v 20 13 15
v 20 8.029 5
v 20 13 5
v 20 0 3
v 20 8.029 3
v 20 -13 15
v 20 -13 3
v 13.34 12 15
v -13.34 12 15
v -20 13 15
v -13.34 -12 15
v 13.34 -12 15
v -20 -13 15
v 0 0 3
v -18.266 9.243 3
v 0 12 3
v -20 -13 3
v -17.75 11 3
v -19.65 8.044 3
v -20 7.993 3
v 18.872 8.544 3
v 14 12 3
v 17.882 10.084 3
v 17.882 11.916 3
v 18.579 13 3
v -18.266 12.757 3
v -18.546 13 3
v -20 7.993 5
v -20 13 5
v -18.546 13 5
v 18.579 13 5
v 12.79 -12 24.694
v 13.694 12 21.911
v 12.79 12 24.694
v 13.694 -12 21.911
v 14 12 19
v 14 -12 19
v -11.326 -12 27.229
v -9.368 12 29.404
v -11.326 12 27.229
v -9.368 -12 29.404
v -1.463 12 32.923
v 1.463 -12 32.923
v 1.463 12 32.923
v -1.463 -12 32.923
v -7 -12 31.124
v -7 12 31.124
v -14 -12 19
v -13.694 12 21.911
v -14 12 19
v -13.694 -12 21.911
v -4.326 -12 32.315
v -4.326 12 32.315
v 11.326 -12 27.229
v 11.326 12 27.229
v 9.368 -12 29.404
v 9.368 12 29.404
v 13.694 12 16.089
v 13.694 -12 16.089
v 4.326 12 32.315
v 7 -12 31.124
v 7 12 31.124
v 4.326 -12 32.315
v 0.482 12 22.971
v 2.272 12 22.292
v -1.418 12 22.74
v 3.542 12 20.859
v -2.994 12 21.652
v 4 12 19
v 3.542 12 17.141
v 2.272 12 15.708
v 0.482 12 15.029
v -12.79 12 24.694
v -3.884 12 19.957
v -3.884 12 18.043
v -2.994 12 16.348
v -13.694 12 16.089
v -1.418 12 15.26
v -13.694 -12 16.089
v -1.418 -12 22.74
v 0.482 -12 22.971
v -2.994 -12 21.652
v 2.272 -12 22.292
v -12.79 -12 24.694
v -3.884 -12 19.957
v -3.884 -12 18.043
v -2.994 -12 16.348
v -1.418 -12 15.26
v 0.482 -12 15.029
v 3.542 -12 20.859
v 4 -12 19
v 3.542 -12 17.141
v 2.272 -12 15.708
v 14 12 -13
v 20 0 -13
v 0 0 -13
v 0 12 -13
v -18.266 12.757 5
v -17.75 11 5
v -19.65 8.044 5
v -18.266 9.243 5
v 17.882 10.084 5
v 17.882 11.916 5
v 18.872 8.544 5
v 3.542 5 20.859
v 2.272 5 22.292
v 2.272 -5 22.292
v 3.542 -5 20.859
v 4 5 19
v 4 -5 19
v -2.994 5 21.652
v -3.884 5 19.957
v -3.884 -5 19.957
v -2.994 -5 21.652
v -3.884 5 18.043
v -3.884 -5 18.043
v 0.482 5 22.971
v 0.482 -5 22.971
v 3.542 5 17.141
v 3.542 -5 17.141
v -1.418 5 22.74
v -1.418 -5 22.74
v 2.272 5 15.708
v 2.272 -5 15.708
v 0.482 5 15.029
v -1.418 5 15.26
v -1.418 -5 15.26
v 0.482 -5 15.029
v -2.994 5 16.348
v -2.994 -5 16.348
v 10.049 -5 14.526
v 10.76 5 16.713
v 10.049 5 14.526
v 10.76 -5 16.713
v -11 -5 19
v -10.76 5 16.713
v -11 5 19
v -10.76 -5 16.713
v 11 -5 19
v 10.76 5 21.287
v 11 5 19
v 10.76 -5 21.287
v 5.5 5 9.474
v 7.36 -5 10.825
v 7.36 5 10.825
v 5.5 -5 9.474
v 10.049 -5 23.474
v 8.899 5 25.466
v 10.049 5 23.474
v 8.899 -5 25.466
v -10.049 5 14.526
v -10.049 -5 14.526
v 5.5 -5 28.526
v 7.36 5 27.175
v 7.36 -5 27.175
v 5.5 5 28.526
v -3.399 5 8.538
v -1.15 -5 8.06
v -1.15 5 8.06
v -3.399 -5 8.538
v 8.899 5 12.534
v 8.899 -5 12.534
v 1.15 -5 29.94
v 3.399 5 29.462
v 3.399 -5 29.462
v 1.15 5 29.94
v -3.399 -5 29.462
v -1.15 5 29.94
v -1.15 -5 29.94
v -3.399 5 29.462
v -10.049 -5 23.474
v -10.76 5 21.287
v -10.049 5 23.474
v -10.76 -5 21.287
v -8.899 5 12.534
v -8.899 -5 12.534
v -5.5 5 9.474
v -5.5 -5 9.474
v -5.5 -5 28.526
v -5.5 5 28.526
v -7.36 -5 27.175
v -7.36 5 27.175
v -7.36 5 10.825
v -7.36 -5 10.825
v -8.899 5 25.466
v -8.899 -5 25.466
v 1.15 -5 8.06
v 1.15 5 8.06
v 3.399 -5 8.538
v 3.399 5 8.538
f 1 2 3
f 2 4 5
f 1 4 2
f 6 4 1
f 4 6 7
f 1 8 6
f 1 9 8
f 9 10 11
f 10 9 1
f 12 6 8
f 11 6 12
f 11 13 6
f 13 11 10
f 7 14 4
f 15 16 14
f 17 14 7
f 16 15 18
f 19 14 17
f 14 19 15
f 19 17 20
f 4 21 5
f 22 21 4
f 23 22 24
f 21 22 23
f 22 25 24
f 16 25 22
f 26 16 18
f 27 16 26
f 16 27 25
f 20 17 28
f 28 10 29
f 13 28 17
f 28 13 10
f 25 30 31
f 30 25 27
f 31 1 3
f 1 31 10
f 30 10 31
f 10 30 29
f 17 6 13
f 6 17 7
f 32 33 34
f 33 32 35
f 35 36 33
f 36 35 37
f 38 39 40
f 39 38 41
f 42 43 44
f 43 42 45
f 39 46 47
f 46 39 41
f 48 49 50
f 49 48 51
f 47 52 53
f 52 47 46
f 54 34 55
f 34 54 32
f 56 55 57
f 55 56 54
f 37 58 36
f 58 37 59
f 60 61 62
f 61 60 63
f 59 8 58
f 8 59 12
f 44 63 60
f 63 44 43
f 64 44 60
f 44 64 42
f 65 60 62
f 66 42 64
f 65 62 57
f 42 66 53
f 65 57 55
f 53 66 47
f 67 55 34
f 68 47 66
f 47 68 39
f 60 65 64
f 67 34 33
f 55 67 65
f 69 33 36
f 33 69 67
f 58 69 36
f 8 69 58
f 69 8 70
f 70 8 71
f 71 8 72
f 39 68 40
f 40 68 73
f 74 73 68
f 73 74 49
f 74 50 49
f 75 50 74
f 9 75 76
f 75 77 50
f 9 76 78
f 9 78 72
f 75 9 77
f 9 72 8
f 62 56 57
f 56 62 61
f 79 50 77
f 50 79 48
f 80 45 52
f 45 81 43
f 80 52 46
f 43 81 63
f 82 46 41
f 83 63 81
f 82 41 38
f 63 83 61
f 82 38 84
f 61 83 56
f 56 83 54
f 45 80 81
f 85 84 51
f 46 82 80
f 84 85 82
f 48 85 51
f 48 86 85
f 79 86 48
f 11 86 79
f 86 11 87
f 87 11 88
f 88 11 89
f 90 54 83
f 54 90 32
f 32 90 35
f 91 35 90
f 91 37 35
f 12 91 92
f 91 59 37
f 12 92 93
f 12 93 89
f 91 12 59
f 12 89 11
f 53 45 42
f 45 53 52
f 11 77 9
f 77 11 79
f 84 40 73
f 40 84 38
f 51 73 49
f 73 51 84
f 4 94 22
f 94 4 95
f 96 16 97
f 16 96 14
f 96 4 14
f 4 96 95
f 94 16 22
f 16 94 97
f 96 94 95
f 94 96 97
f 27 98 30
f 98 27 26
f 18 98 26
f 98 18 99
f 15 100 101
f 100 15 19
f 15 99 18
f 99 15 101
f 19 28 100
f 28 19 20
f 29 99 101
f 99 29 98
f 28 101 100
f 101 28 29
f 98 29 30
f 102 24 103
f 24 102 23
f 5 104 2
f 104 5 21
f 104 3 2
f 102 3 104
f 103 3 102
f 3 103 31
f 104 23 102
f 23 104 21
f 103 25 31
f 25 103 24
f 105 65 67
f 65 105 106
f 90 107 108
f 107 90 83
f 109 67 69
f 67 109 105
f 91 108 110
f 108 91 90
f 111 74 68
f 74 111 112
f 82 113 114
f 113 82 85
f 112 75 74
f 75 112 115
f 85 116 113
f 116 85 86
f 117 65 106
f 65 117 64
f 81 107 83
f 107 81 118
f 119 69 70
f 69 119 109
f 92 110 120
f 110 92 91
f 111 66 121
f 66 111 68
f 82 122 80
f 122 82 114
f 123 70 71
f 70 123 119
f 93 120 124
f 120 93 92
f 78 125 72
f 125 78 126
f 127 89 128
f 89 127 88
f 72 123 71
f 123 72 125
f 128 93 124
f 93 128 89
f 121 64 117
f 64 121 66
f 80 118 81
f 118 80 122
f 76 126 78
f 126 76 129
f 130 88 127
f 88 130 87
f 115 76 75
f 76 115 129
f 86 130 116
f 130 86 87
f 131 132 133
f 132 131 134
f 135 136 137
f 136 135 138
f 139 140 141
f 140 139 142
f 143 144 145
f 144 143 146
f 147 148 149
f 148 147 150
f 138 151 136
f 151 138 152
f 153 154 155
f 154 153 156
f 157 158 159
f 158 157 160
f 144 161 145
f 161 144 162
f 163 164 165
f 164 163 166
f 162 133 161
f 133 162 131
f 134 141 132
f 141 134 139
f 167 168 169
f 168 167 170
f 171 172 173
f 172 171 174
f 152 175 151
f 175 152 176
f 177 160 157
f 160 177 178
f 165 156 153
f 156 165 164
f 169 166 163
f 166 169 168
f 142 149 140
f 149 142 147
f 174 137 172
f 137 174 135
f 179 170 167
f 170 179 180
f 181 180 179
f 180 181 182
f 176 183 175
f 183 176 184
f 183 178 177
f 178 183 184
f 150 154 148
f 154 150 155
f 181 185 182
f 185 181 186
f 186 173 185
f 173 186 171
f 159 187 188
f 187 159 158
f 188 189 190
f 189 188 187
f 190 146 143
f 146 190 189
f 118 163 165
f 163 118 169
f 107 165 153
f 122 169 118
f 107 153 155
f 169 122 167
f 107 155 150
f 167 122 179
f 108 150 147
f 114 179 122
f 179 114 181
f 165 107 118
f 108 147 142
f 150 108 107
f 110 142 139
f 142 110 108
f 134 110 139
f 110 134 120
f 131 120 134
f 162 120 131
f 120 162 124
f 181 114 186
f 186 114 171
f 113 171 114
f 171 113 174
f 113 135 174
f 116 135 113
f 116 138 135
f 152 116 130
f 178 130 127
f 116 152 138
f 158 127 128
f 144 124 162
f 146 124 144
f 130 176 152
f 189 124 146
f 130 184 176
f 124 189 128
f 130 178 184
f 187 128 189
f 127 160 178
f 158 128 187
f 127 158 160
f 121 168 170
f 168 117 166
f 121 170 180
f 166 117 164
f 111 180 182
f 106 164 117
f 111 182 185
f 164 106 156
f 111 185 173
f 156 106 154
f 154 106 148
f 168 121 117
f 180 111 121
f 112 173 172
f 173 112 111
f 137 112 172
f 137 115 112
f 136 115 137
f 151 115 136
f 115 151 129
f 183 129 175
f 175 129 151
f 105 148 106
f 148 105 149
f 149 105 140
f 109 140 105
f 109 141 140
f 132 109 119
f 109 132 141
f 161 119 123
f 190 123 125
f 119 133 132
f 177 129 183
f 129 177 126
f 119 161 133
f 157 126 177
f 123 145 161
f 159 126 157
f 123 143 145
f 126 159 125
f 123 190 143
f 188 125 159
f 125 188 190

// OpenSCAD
// Parameters
shaft_diameter = 8.0; //[4.0:16.0:0.1]
base_length = 55.0; //[30.0:110.0:0.5]
base_width = 42.0; //[21.0:84.0:0.5]
base_thickness = 8.0; //[4.0:16.0:0.5]
overall_height = 28.0; //[14.0:56.0:0.5]
mount_hole_diameter = 6.5; //[3.0:12.0:0.1]
mount_hole_spacing = 42.0; //[20.0:90.0:0.5]
mount_hole_edge_offset = 10.0; //[5.0:20.0:0.5]
bearing_outer_diameter = 22.0; //[14.0:44.0:0.1]
bearing_width = 7.0; //[4.0:20.0:0.1]
fillet_radius = 2.0; //[0.5:6.0:0.5]
overlap = 1.0; //[0.5:2.0:0.1]
housing_length_x = 40.0; //[25.0:80.0:0.5]
housing_width_y = 26.0; //[16.0:52.0:0.5]
housing_base_height = 12.0; //[6.0:24.0:0.5]
housing_top_radius = 14.0; //[8.0:28.0:0.5]
housing_top_length_y = 24.0; //[14.0:48.0:0.5]
bearing_seat_depth = 10.0; //[5.0:20.0:0.5]

// Right Trapezoid
module right_trapezoid() {
  color("DimGray") {
    linear_extrude(height=housing_width_y, center=true) {
      polygon(points=[
        [0, 0],
        [housing_length_x/2, 0],
        [housing_length_x/2 - (housing_length_x*0.15), housing_base_height],
        [0, housing_base_height]
      ]);
    }
  }
}

// KP Pillow Block Hole Positions
module kp_pillow_block_hole_positions() {
  color("Silver") {
    translate([-mount_hole_spacing/2, base_width/2 - mount_hole_edge_offset, 0])
      cylinder(r=mount_hole_diameter/2, h=base_thickness + 2*overlap, center=true);
    translate([mount_hole_spacing/2, base_width/2 - mount_hole_edge_offset, 0])
      cylinder(r=mount_hole_diameter/2, h=base_thickness + 2*overlap, center=true);
  }
}

// KP Pillow Block
module kp_pillow_block() {
  color("Black") {
    union() {
      translate([0, 0, base_thickness/2 + housing_base_height/2 - overlap])
        cube([housing_length_x, housing_width_y, housing_base_height], center=true);
      translate([0, 0, base_thickness/2 + housing_base_height - overlap + (overall_height - base_thickness - housing_base_height)/2])
        rotate([90, 0, 0])
        cylinder(r=housing_top_radius, h=housing_top_length_y, center=true);
      right_trapezoid();
    }
  }
}

// KP Pillow Block Assembly
module kp_pillow_block_assembly() {
  difference() {
    kp_pillow_block();
    translate([0, 0, base_thickness/2 + housing_base_height - overlap + (overall_height - base_thickness - housing_base_height)/2])
      rotate([90, 0, 0])
      cylinder(r=shaft_diameter/2, h=base_width + housing_top_length_y + 2*overlap, center=true);
    translate([0, 0, base_thickness/2 + housing_base_height - overlap + (overall_height - base_thickness - housing_base_height)/2])
      rotate([90, 0, 0])
      cylinder(r=bearing_outer_diameter/2, h=bearing_seat_depth, center=true);
    kp_pillow_block_hole_positions();
  }
}

// SCS Bearing Block Assembly
module scs_bearing_block_assembly() {
  kp_pillow_block_assembly();
}

// Assembly
module assembly() {
  scs_bearing_block_assembly();
}

assembly();
